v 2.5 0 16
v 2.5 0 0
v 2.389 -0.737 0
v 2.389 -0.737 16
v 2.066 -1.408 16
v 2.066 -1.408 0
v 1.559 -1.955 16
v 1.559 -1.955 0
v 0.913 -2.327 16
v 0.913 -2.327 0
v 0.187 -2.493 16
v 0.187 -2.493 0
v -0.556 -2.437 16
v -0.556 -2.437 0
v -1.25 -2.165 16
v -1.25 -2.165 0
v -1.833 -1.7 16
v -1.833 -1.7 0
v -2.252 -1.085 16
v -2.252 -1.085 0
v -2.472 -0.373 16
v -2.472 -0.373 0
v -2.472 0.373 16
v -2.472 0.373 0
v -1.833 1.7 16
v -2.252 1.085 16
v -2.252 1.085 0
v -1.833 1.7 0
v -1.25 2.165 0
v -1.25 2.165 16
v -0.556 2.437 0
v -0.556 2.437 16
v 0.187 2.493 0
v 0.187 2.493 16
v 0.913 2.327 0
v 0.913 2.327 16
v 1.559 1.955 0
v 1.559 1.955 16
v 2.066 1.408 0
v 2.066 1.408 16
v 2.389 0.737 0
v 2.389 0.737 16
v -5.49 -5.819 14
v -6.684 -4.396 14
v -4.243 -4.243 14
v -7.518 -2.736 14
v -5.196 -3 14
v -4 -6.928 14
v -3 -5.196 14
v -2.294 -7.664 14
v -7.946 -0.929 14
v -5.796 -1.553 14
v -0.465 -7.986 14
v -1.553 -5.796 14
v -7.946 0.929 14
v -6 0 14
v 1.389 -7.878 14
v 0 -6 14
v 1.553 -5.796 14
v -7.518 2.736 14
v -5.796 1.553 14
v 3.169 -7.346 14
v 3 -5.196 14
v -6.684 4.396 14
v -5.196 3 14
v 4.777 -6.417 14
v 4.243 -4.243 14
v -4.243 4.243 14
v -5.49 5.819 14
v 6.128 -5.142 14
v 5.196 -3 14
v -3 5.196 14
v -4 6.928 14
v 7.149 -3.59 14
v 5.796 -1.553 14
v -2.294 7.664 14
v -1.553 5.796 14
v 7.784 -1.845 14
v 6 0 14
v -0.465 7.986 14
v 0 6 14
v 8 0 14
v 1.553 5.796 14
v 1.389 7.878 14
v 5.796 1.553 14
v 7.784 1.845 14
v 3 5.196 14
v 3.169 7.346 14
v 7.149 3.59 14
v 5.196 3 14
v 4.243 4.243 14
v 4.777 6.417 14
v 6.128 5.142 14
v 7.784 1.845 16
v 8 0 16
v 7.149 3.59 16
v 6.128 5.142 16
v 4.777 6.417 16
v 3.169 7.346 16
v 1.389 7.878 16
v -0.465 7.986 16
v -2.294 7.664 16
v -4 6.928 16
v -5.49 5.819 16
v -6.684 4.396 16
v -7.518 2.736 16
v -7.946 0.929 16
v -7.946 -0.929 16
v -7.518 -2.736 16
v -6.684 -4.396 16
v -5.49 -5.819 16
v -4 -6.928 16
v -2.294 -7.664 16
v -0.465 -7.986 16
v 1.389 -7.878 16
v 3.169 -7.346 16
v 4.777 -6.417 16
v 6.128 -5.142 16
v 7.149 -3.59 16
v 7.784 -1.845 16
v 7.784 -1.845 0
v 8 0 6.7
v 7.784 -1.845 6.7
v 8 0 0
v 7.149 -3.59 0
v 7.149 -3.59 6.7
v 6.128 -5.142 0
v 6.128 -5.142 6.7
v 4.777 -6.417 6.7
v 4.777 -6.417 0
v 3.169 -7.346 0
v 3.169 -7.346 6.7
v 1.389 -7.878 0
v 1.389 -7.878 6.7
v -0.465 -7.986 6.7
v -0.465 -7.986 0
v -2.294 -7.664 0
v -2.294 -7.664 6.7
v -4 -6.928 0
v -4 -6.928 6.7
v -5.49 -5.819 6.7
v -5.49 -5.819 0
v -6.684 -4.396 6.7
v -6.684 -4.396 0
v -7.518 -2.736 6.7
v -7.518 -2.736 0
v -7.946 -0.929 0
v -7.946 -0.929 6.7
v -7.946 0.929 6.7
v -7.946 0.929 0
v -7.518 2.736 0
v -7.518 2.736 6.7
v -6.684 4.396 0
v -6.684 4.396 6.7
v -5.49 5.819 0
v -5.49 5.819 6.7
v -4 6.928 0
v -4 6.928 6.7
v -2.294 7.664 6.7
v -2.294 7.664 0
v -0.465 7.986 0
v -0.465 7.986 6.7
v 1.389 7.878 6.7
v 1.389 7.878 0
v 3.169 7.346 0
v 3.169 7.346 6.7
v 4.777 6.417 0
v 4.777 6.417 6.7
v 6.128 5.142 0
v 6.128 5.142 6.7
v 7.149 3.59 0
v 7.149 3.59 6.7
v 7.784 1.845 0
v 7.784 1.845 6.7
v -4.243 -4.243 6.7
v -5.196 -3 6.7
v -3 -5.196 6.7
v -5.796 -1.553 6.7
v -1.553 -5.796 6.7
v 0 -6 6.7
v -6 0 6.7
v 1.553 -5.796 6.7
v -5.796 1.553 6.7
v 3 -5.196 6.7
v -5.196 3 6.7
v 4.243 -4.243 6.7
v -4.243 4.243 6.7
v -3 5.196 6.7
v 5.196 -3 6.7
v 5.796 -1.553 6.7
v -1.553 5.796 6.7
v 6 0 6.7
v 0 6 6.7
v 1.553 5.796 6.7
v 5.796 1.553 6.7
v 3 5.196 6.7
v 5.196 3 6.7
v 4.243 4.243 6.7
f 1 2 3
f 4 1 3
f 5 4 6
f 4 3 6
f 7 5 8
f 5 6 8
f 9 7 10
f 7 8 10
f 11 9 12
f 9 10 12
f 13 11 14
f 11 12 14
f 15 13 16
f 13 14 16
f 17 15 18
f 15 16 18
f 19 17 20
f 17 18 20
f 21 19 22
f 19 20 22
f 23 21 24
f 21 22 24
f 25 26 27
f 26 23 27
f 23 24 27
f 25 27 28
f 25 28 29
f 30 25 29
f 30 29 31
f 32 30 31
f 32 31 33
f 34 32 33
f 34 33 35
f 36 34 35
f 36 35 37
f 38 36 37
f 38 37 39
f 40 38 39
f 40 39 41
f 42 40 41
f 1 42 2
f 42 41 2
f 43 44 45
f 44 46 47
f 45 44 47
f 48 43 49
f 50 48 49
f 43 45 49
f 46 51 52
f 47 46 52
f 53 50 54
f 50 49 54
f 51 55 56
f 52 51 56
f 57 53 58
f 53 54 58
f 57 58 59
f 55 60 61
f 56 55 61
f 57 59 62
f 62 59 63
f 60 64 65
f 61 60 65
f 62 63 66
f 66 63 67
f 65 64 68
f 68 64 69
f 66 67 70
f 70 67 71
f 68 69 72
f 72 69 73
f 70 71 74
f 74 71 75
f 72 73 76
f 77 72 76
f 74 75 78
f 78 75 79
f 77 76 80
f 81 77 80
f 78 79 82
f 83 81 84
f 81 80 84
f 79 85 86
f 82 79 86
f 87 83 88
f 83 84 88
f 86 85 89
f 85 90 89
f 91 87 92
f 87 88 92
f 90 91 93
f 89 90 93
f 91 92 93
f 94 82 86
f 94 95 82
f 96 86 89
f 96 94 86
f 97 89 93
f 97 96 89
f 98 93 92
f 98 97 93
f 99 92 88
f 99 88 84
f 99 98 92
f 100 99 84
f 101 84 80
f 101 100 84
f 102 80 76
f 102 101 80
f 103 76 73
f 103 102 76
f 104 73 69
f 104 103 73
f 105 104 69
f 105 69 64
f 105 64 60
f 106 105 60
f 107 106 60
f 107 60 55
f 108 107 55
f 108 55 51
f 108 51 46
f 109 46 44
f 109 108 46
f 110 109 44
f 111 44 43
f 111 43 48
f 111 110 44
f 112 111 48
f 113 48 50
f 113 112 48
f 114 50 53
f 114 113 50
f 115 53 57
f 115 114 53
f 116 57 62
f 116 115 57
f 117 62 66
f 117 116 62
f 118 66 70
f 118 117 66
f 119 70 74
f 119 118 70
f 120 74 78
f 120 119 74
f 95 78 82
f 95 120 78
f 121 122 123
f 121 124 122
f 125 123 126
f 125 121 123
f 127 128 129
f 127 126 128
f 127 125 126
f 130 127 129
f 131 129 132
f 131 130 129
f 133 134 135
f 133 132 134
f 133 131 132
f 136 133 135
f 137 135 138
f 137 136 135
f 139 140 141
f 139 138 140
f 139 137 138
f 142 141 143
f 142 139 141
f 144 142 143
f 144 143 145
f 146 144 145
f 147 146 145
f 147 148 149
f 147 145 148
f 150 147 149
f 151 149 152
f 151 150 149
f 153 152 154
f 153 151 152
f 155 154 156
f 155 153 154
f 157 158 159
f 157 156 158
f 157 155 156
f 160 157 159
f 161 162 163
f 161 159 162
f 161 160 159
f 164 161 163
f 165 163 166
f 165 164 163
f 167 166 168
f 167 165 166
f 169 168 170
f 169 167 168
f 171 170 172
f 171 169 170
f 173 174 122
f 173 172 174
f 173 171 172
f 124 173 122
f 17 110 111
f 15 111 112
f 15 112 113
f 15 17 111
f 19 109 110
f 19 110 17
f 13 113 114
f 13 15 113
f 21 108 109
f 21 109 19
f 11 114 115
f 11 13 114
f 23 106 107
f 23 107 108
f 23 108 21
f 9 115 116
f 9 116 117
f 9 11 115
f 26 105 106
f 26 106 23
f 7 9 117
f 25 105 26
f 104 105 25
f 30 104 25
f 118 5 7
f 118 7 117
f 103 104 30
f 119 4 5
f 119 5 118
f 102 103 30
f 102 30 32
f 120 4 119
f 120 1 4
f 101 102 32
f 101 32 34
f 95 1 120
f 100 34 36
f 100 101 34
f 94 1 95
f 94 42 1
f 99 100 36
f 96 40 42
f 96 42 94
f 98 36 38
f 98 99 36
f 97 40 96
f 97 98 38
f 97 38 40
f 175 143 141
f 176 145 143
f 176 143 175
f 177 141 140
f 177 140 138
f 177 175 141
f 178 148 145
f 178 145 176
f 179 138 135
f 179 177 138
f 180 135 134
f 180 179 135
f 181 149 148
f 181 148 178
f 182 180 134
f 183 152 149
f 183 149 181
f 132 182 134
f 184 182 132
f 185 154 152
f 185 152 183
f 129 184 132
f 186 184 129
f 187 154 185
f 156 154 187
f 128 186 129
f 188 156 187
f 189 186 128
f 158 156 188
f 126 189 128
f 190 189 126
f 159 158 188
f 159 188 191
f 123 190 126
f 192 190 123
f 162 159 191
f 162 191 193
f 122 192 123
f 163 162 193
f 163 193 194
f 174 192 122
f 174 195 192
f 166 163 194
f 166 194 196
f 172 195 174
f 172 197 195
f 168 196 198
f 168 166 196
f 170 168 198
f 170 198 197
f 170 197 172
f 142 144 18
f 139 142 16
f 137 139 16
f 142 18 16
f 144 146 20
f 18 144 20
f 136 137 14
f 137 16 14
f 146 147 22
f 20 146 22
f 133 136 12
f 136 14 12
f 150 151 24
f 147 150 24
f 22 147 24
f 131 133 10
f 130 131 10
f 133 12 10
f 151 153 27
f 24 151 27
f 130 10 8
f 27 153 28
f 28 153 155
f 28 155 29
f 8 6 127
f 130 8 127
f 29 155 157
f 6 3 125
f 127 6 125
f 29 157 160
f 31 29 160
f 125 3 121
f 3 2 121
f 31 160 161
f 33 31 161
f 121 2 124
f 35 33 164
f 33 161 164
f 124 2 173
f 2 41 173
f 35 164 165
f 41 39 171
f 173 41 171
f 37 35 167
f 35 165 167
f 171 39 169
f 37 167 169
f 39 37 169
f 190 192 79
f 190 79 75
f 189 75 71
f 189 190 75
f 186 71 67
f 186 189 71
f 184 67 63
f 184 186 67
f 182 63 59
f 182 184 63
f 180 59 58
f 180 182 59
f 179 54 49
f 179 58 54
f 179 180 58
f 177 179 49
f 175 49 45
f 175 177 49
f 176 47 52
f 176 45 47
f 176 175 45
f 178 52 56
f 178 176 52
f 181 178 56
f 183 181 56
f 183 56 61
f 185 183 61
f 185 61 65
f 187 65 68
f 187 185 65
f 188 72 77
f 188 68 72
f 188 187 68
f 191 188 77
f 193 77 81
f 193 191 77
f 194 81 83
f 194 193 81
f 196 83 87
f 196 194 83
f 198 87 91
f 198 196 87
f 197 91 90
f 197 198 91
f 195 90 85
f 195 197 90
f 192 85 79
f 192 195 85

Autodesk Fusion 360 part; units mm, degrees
sketch "Sketch1" plane through (0, 0, 0) normal (0, 0, 1) x (1, 0, 0)
  circle A0 centre (0, 0) radius 8
  circle A1 centre (0, 0) radius 2.5
  circle A2 centre (0, 0) radius 6
  dimension "d1" = 16
  dimension "d2" = 5
  dimension "d3" = 12
extrude "Extrude1" add sketch "Sketch1" along normal blind 6.7 contours A0 | A2
extrude "Extrude2" add sketch "Sketch1" along normal blind 16 contours A2
extrude "Extrude3" add sketch "Sketch1" against normal blind 2 from surface at 16 contours A0
equation "d4 = 16 mm - 7.3 mm - 2 mm"
